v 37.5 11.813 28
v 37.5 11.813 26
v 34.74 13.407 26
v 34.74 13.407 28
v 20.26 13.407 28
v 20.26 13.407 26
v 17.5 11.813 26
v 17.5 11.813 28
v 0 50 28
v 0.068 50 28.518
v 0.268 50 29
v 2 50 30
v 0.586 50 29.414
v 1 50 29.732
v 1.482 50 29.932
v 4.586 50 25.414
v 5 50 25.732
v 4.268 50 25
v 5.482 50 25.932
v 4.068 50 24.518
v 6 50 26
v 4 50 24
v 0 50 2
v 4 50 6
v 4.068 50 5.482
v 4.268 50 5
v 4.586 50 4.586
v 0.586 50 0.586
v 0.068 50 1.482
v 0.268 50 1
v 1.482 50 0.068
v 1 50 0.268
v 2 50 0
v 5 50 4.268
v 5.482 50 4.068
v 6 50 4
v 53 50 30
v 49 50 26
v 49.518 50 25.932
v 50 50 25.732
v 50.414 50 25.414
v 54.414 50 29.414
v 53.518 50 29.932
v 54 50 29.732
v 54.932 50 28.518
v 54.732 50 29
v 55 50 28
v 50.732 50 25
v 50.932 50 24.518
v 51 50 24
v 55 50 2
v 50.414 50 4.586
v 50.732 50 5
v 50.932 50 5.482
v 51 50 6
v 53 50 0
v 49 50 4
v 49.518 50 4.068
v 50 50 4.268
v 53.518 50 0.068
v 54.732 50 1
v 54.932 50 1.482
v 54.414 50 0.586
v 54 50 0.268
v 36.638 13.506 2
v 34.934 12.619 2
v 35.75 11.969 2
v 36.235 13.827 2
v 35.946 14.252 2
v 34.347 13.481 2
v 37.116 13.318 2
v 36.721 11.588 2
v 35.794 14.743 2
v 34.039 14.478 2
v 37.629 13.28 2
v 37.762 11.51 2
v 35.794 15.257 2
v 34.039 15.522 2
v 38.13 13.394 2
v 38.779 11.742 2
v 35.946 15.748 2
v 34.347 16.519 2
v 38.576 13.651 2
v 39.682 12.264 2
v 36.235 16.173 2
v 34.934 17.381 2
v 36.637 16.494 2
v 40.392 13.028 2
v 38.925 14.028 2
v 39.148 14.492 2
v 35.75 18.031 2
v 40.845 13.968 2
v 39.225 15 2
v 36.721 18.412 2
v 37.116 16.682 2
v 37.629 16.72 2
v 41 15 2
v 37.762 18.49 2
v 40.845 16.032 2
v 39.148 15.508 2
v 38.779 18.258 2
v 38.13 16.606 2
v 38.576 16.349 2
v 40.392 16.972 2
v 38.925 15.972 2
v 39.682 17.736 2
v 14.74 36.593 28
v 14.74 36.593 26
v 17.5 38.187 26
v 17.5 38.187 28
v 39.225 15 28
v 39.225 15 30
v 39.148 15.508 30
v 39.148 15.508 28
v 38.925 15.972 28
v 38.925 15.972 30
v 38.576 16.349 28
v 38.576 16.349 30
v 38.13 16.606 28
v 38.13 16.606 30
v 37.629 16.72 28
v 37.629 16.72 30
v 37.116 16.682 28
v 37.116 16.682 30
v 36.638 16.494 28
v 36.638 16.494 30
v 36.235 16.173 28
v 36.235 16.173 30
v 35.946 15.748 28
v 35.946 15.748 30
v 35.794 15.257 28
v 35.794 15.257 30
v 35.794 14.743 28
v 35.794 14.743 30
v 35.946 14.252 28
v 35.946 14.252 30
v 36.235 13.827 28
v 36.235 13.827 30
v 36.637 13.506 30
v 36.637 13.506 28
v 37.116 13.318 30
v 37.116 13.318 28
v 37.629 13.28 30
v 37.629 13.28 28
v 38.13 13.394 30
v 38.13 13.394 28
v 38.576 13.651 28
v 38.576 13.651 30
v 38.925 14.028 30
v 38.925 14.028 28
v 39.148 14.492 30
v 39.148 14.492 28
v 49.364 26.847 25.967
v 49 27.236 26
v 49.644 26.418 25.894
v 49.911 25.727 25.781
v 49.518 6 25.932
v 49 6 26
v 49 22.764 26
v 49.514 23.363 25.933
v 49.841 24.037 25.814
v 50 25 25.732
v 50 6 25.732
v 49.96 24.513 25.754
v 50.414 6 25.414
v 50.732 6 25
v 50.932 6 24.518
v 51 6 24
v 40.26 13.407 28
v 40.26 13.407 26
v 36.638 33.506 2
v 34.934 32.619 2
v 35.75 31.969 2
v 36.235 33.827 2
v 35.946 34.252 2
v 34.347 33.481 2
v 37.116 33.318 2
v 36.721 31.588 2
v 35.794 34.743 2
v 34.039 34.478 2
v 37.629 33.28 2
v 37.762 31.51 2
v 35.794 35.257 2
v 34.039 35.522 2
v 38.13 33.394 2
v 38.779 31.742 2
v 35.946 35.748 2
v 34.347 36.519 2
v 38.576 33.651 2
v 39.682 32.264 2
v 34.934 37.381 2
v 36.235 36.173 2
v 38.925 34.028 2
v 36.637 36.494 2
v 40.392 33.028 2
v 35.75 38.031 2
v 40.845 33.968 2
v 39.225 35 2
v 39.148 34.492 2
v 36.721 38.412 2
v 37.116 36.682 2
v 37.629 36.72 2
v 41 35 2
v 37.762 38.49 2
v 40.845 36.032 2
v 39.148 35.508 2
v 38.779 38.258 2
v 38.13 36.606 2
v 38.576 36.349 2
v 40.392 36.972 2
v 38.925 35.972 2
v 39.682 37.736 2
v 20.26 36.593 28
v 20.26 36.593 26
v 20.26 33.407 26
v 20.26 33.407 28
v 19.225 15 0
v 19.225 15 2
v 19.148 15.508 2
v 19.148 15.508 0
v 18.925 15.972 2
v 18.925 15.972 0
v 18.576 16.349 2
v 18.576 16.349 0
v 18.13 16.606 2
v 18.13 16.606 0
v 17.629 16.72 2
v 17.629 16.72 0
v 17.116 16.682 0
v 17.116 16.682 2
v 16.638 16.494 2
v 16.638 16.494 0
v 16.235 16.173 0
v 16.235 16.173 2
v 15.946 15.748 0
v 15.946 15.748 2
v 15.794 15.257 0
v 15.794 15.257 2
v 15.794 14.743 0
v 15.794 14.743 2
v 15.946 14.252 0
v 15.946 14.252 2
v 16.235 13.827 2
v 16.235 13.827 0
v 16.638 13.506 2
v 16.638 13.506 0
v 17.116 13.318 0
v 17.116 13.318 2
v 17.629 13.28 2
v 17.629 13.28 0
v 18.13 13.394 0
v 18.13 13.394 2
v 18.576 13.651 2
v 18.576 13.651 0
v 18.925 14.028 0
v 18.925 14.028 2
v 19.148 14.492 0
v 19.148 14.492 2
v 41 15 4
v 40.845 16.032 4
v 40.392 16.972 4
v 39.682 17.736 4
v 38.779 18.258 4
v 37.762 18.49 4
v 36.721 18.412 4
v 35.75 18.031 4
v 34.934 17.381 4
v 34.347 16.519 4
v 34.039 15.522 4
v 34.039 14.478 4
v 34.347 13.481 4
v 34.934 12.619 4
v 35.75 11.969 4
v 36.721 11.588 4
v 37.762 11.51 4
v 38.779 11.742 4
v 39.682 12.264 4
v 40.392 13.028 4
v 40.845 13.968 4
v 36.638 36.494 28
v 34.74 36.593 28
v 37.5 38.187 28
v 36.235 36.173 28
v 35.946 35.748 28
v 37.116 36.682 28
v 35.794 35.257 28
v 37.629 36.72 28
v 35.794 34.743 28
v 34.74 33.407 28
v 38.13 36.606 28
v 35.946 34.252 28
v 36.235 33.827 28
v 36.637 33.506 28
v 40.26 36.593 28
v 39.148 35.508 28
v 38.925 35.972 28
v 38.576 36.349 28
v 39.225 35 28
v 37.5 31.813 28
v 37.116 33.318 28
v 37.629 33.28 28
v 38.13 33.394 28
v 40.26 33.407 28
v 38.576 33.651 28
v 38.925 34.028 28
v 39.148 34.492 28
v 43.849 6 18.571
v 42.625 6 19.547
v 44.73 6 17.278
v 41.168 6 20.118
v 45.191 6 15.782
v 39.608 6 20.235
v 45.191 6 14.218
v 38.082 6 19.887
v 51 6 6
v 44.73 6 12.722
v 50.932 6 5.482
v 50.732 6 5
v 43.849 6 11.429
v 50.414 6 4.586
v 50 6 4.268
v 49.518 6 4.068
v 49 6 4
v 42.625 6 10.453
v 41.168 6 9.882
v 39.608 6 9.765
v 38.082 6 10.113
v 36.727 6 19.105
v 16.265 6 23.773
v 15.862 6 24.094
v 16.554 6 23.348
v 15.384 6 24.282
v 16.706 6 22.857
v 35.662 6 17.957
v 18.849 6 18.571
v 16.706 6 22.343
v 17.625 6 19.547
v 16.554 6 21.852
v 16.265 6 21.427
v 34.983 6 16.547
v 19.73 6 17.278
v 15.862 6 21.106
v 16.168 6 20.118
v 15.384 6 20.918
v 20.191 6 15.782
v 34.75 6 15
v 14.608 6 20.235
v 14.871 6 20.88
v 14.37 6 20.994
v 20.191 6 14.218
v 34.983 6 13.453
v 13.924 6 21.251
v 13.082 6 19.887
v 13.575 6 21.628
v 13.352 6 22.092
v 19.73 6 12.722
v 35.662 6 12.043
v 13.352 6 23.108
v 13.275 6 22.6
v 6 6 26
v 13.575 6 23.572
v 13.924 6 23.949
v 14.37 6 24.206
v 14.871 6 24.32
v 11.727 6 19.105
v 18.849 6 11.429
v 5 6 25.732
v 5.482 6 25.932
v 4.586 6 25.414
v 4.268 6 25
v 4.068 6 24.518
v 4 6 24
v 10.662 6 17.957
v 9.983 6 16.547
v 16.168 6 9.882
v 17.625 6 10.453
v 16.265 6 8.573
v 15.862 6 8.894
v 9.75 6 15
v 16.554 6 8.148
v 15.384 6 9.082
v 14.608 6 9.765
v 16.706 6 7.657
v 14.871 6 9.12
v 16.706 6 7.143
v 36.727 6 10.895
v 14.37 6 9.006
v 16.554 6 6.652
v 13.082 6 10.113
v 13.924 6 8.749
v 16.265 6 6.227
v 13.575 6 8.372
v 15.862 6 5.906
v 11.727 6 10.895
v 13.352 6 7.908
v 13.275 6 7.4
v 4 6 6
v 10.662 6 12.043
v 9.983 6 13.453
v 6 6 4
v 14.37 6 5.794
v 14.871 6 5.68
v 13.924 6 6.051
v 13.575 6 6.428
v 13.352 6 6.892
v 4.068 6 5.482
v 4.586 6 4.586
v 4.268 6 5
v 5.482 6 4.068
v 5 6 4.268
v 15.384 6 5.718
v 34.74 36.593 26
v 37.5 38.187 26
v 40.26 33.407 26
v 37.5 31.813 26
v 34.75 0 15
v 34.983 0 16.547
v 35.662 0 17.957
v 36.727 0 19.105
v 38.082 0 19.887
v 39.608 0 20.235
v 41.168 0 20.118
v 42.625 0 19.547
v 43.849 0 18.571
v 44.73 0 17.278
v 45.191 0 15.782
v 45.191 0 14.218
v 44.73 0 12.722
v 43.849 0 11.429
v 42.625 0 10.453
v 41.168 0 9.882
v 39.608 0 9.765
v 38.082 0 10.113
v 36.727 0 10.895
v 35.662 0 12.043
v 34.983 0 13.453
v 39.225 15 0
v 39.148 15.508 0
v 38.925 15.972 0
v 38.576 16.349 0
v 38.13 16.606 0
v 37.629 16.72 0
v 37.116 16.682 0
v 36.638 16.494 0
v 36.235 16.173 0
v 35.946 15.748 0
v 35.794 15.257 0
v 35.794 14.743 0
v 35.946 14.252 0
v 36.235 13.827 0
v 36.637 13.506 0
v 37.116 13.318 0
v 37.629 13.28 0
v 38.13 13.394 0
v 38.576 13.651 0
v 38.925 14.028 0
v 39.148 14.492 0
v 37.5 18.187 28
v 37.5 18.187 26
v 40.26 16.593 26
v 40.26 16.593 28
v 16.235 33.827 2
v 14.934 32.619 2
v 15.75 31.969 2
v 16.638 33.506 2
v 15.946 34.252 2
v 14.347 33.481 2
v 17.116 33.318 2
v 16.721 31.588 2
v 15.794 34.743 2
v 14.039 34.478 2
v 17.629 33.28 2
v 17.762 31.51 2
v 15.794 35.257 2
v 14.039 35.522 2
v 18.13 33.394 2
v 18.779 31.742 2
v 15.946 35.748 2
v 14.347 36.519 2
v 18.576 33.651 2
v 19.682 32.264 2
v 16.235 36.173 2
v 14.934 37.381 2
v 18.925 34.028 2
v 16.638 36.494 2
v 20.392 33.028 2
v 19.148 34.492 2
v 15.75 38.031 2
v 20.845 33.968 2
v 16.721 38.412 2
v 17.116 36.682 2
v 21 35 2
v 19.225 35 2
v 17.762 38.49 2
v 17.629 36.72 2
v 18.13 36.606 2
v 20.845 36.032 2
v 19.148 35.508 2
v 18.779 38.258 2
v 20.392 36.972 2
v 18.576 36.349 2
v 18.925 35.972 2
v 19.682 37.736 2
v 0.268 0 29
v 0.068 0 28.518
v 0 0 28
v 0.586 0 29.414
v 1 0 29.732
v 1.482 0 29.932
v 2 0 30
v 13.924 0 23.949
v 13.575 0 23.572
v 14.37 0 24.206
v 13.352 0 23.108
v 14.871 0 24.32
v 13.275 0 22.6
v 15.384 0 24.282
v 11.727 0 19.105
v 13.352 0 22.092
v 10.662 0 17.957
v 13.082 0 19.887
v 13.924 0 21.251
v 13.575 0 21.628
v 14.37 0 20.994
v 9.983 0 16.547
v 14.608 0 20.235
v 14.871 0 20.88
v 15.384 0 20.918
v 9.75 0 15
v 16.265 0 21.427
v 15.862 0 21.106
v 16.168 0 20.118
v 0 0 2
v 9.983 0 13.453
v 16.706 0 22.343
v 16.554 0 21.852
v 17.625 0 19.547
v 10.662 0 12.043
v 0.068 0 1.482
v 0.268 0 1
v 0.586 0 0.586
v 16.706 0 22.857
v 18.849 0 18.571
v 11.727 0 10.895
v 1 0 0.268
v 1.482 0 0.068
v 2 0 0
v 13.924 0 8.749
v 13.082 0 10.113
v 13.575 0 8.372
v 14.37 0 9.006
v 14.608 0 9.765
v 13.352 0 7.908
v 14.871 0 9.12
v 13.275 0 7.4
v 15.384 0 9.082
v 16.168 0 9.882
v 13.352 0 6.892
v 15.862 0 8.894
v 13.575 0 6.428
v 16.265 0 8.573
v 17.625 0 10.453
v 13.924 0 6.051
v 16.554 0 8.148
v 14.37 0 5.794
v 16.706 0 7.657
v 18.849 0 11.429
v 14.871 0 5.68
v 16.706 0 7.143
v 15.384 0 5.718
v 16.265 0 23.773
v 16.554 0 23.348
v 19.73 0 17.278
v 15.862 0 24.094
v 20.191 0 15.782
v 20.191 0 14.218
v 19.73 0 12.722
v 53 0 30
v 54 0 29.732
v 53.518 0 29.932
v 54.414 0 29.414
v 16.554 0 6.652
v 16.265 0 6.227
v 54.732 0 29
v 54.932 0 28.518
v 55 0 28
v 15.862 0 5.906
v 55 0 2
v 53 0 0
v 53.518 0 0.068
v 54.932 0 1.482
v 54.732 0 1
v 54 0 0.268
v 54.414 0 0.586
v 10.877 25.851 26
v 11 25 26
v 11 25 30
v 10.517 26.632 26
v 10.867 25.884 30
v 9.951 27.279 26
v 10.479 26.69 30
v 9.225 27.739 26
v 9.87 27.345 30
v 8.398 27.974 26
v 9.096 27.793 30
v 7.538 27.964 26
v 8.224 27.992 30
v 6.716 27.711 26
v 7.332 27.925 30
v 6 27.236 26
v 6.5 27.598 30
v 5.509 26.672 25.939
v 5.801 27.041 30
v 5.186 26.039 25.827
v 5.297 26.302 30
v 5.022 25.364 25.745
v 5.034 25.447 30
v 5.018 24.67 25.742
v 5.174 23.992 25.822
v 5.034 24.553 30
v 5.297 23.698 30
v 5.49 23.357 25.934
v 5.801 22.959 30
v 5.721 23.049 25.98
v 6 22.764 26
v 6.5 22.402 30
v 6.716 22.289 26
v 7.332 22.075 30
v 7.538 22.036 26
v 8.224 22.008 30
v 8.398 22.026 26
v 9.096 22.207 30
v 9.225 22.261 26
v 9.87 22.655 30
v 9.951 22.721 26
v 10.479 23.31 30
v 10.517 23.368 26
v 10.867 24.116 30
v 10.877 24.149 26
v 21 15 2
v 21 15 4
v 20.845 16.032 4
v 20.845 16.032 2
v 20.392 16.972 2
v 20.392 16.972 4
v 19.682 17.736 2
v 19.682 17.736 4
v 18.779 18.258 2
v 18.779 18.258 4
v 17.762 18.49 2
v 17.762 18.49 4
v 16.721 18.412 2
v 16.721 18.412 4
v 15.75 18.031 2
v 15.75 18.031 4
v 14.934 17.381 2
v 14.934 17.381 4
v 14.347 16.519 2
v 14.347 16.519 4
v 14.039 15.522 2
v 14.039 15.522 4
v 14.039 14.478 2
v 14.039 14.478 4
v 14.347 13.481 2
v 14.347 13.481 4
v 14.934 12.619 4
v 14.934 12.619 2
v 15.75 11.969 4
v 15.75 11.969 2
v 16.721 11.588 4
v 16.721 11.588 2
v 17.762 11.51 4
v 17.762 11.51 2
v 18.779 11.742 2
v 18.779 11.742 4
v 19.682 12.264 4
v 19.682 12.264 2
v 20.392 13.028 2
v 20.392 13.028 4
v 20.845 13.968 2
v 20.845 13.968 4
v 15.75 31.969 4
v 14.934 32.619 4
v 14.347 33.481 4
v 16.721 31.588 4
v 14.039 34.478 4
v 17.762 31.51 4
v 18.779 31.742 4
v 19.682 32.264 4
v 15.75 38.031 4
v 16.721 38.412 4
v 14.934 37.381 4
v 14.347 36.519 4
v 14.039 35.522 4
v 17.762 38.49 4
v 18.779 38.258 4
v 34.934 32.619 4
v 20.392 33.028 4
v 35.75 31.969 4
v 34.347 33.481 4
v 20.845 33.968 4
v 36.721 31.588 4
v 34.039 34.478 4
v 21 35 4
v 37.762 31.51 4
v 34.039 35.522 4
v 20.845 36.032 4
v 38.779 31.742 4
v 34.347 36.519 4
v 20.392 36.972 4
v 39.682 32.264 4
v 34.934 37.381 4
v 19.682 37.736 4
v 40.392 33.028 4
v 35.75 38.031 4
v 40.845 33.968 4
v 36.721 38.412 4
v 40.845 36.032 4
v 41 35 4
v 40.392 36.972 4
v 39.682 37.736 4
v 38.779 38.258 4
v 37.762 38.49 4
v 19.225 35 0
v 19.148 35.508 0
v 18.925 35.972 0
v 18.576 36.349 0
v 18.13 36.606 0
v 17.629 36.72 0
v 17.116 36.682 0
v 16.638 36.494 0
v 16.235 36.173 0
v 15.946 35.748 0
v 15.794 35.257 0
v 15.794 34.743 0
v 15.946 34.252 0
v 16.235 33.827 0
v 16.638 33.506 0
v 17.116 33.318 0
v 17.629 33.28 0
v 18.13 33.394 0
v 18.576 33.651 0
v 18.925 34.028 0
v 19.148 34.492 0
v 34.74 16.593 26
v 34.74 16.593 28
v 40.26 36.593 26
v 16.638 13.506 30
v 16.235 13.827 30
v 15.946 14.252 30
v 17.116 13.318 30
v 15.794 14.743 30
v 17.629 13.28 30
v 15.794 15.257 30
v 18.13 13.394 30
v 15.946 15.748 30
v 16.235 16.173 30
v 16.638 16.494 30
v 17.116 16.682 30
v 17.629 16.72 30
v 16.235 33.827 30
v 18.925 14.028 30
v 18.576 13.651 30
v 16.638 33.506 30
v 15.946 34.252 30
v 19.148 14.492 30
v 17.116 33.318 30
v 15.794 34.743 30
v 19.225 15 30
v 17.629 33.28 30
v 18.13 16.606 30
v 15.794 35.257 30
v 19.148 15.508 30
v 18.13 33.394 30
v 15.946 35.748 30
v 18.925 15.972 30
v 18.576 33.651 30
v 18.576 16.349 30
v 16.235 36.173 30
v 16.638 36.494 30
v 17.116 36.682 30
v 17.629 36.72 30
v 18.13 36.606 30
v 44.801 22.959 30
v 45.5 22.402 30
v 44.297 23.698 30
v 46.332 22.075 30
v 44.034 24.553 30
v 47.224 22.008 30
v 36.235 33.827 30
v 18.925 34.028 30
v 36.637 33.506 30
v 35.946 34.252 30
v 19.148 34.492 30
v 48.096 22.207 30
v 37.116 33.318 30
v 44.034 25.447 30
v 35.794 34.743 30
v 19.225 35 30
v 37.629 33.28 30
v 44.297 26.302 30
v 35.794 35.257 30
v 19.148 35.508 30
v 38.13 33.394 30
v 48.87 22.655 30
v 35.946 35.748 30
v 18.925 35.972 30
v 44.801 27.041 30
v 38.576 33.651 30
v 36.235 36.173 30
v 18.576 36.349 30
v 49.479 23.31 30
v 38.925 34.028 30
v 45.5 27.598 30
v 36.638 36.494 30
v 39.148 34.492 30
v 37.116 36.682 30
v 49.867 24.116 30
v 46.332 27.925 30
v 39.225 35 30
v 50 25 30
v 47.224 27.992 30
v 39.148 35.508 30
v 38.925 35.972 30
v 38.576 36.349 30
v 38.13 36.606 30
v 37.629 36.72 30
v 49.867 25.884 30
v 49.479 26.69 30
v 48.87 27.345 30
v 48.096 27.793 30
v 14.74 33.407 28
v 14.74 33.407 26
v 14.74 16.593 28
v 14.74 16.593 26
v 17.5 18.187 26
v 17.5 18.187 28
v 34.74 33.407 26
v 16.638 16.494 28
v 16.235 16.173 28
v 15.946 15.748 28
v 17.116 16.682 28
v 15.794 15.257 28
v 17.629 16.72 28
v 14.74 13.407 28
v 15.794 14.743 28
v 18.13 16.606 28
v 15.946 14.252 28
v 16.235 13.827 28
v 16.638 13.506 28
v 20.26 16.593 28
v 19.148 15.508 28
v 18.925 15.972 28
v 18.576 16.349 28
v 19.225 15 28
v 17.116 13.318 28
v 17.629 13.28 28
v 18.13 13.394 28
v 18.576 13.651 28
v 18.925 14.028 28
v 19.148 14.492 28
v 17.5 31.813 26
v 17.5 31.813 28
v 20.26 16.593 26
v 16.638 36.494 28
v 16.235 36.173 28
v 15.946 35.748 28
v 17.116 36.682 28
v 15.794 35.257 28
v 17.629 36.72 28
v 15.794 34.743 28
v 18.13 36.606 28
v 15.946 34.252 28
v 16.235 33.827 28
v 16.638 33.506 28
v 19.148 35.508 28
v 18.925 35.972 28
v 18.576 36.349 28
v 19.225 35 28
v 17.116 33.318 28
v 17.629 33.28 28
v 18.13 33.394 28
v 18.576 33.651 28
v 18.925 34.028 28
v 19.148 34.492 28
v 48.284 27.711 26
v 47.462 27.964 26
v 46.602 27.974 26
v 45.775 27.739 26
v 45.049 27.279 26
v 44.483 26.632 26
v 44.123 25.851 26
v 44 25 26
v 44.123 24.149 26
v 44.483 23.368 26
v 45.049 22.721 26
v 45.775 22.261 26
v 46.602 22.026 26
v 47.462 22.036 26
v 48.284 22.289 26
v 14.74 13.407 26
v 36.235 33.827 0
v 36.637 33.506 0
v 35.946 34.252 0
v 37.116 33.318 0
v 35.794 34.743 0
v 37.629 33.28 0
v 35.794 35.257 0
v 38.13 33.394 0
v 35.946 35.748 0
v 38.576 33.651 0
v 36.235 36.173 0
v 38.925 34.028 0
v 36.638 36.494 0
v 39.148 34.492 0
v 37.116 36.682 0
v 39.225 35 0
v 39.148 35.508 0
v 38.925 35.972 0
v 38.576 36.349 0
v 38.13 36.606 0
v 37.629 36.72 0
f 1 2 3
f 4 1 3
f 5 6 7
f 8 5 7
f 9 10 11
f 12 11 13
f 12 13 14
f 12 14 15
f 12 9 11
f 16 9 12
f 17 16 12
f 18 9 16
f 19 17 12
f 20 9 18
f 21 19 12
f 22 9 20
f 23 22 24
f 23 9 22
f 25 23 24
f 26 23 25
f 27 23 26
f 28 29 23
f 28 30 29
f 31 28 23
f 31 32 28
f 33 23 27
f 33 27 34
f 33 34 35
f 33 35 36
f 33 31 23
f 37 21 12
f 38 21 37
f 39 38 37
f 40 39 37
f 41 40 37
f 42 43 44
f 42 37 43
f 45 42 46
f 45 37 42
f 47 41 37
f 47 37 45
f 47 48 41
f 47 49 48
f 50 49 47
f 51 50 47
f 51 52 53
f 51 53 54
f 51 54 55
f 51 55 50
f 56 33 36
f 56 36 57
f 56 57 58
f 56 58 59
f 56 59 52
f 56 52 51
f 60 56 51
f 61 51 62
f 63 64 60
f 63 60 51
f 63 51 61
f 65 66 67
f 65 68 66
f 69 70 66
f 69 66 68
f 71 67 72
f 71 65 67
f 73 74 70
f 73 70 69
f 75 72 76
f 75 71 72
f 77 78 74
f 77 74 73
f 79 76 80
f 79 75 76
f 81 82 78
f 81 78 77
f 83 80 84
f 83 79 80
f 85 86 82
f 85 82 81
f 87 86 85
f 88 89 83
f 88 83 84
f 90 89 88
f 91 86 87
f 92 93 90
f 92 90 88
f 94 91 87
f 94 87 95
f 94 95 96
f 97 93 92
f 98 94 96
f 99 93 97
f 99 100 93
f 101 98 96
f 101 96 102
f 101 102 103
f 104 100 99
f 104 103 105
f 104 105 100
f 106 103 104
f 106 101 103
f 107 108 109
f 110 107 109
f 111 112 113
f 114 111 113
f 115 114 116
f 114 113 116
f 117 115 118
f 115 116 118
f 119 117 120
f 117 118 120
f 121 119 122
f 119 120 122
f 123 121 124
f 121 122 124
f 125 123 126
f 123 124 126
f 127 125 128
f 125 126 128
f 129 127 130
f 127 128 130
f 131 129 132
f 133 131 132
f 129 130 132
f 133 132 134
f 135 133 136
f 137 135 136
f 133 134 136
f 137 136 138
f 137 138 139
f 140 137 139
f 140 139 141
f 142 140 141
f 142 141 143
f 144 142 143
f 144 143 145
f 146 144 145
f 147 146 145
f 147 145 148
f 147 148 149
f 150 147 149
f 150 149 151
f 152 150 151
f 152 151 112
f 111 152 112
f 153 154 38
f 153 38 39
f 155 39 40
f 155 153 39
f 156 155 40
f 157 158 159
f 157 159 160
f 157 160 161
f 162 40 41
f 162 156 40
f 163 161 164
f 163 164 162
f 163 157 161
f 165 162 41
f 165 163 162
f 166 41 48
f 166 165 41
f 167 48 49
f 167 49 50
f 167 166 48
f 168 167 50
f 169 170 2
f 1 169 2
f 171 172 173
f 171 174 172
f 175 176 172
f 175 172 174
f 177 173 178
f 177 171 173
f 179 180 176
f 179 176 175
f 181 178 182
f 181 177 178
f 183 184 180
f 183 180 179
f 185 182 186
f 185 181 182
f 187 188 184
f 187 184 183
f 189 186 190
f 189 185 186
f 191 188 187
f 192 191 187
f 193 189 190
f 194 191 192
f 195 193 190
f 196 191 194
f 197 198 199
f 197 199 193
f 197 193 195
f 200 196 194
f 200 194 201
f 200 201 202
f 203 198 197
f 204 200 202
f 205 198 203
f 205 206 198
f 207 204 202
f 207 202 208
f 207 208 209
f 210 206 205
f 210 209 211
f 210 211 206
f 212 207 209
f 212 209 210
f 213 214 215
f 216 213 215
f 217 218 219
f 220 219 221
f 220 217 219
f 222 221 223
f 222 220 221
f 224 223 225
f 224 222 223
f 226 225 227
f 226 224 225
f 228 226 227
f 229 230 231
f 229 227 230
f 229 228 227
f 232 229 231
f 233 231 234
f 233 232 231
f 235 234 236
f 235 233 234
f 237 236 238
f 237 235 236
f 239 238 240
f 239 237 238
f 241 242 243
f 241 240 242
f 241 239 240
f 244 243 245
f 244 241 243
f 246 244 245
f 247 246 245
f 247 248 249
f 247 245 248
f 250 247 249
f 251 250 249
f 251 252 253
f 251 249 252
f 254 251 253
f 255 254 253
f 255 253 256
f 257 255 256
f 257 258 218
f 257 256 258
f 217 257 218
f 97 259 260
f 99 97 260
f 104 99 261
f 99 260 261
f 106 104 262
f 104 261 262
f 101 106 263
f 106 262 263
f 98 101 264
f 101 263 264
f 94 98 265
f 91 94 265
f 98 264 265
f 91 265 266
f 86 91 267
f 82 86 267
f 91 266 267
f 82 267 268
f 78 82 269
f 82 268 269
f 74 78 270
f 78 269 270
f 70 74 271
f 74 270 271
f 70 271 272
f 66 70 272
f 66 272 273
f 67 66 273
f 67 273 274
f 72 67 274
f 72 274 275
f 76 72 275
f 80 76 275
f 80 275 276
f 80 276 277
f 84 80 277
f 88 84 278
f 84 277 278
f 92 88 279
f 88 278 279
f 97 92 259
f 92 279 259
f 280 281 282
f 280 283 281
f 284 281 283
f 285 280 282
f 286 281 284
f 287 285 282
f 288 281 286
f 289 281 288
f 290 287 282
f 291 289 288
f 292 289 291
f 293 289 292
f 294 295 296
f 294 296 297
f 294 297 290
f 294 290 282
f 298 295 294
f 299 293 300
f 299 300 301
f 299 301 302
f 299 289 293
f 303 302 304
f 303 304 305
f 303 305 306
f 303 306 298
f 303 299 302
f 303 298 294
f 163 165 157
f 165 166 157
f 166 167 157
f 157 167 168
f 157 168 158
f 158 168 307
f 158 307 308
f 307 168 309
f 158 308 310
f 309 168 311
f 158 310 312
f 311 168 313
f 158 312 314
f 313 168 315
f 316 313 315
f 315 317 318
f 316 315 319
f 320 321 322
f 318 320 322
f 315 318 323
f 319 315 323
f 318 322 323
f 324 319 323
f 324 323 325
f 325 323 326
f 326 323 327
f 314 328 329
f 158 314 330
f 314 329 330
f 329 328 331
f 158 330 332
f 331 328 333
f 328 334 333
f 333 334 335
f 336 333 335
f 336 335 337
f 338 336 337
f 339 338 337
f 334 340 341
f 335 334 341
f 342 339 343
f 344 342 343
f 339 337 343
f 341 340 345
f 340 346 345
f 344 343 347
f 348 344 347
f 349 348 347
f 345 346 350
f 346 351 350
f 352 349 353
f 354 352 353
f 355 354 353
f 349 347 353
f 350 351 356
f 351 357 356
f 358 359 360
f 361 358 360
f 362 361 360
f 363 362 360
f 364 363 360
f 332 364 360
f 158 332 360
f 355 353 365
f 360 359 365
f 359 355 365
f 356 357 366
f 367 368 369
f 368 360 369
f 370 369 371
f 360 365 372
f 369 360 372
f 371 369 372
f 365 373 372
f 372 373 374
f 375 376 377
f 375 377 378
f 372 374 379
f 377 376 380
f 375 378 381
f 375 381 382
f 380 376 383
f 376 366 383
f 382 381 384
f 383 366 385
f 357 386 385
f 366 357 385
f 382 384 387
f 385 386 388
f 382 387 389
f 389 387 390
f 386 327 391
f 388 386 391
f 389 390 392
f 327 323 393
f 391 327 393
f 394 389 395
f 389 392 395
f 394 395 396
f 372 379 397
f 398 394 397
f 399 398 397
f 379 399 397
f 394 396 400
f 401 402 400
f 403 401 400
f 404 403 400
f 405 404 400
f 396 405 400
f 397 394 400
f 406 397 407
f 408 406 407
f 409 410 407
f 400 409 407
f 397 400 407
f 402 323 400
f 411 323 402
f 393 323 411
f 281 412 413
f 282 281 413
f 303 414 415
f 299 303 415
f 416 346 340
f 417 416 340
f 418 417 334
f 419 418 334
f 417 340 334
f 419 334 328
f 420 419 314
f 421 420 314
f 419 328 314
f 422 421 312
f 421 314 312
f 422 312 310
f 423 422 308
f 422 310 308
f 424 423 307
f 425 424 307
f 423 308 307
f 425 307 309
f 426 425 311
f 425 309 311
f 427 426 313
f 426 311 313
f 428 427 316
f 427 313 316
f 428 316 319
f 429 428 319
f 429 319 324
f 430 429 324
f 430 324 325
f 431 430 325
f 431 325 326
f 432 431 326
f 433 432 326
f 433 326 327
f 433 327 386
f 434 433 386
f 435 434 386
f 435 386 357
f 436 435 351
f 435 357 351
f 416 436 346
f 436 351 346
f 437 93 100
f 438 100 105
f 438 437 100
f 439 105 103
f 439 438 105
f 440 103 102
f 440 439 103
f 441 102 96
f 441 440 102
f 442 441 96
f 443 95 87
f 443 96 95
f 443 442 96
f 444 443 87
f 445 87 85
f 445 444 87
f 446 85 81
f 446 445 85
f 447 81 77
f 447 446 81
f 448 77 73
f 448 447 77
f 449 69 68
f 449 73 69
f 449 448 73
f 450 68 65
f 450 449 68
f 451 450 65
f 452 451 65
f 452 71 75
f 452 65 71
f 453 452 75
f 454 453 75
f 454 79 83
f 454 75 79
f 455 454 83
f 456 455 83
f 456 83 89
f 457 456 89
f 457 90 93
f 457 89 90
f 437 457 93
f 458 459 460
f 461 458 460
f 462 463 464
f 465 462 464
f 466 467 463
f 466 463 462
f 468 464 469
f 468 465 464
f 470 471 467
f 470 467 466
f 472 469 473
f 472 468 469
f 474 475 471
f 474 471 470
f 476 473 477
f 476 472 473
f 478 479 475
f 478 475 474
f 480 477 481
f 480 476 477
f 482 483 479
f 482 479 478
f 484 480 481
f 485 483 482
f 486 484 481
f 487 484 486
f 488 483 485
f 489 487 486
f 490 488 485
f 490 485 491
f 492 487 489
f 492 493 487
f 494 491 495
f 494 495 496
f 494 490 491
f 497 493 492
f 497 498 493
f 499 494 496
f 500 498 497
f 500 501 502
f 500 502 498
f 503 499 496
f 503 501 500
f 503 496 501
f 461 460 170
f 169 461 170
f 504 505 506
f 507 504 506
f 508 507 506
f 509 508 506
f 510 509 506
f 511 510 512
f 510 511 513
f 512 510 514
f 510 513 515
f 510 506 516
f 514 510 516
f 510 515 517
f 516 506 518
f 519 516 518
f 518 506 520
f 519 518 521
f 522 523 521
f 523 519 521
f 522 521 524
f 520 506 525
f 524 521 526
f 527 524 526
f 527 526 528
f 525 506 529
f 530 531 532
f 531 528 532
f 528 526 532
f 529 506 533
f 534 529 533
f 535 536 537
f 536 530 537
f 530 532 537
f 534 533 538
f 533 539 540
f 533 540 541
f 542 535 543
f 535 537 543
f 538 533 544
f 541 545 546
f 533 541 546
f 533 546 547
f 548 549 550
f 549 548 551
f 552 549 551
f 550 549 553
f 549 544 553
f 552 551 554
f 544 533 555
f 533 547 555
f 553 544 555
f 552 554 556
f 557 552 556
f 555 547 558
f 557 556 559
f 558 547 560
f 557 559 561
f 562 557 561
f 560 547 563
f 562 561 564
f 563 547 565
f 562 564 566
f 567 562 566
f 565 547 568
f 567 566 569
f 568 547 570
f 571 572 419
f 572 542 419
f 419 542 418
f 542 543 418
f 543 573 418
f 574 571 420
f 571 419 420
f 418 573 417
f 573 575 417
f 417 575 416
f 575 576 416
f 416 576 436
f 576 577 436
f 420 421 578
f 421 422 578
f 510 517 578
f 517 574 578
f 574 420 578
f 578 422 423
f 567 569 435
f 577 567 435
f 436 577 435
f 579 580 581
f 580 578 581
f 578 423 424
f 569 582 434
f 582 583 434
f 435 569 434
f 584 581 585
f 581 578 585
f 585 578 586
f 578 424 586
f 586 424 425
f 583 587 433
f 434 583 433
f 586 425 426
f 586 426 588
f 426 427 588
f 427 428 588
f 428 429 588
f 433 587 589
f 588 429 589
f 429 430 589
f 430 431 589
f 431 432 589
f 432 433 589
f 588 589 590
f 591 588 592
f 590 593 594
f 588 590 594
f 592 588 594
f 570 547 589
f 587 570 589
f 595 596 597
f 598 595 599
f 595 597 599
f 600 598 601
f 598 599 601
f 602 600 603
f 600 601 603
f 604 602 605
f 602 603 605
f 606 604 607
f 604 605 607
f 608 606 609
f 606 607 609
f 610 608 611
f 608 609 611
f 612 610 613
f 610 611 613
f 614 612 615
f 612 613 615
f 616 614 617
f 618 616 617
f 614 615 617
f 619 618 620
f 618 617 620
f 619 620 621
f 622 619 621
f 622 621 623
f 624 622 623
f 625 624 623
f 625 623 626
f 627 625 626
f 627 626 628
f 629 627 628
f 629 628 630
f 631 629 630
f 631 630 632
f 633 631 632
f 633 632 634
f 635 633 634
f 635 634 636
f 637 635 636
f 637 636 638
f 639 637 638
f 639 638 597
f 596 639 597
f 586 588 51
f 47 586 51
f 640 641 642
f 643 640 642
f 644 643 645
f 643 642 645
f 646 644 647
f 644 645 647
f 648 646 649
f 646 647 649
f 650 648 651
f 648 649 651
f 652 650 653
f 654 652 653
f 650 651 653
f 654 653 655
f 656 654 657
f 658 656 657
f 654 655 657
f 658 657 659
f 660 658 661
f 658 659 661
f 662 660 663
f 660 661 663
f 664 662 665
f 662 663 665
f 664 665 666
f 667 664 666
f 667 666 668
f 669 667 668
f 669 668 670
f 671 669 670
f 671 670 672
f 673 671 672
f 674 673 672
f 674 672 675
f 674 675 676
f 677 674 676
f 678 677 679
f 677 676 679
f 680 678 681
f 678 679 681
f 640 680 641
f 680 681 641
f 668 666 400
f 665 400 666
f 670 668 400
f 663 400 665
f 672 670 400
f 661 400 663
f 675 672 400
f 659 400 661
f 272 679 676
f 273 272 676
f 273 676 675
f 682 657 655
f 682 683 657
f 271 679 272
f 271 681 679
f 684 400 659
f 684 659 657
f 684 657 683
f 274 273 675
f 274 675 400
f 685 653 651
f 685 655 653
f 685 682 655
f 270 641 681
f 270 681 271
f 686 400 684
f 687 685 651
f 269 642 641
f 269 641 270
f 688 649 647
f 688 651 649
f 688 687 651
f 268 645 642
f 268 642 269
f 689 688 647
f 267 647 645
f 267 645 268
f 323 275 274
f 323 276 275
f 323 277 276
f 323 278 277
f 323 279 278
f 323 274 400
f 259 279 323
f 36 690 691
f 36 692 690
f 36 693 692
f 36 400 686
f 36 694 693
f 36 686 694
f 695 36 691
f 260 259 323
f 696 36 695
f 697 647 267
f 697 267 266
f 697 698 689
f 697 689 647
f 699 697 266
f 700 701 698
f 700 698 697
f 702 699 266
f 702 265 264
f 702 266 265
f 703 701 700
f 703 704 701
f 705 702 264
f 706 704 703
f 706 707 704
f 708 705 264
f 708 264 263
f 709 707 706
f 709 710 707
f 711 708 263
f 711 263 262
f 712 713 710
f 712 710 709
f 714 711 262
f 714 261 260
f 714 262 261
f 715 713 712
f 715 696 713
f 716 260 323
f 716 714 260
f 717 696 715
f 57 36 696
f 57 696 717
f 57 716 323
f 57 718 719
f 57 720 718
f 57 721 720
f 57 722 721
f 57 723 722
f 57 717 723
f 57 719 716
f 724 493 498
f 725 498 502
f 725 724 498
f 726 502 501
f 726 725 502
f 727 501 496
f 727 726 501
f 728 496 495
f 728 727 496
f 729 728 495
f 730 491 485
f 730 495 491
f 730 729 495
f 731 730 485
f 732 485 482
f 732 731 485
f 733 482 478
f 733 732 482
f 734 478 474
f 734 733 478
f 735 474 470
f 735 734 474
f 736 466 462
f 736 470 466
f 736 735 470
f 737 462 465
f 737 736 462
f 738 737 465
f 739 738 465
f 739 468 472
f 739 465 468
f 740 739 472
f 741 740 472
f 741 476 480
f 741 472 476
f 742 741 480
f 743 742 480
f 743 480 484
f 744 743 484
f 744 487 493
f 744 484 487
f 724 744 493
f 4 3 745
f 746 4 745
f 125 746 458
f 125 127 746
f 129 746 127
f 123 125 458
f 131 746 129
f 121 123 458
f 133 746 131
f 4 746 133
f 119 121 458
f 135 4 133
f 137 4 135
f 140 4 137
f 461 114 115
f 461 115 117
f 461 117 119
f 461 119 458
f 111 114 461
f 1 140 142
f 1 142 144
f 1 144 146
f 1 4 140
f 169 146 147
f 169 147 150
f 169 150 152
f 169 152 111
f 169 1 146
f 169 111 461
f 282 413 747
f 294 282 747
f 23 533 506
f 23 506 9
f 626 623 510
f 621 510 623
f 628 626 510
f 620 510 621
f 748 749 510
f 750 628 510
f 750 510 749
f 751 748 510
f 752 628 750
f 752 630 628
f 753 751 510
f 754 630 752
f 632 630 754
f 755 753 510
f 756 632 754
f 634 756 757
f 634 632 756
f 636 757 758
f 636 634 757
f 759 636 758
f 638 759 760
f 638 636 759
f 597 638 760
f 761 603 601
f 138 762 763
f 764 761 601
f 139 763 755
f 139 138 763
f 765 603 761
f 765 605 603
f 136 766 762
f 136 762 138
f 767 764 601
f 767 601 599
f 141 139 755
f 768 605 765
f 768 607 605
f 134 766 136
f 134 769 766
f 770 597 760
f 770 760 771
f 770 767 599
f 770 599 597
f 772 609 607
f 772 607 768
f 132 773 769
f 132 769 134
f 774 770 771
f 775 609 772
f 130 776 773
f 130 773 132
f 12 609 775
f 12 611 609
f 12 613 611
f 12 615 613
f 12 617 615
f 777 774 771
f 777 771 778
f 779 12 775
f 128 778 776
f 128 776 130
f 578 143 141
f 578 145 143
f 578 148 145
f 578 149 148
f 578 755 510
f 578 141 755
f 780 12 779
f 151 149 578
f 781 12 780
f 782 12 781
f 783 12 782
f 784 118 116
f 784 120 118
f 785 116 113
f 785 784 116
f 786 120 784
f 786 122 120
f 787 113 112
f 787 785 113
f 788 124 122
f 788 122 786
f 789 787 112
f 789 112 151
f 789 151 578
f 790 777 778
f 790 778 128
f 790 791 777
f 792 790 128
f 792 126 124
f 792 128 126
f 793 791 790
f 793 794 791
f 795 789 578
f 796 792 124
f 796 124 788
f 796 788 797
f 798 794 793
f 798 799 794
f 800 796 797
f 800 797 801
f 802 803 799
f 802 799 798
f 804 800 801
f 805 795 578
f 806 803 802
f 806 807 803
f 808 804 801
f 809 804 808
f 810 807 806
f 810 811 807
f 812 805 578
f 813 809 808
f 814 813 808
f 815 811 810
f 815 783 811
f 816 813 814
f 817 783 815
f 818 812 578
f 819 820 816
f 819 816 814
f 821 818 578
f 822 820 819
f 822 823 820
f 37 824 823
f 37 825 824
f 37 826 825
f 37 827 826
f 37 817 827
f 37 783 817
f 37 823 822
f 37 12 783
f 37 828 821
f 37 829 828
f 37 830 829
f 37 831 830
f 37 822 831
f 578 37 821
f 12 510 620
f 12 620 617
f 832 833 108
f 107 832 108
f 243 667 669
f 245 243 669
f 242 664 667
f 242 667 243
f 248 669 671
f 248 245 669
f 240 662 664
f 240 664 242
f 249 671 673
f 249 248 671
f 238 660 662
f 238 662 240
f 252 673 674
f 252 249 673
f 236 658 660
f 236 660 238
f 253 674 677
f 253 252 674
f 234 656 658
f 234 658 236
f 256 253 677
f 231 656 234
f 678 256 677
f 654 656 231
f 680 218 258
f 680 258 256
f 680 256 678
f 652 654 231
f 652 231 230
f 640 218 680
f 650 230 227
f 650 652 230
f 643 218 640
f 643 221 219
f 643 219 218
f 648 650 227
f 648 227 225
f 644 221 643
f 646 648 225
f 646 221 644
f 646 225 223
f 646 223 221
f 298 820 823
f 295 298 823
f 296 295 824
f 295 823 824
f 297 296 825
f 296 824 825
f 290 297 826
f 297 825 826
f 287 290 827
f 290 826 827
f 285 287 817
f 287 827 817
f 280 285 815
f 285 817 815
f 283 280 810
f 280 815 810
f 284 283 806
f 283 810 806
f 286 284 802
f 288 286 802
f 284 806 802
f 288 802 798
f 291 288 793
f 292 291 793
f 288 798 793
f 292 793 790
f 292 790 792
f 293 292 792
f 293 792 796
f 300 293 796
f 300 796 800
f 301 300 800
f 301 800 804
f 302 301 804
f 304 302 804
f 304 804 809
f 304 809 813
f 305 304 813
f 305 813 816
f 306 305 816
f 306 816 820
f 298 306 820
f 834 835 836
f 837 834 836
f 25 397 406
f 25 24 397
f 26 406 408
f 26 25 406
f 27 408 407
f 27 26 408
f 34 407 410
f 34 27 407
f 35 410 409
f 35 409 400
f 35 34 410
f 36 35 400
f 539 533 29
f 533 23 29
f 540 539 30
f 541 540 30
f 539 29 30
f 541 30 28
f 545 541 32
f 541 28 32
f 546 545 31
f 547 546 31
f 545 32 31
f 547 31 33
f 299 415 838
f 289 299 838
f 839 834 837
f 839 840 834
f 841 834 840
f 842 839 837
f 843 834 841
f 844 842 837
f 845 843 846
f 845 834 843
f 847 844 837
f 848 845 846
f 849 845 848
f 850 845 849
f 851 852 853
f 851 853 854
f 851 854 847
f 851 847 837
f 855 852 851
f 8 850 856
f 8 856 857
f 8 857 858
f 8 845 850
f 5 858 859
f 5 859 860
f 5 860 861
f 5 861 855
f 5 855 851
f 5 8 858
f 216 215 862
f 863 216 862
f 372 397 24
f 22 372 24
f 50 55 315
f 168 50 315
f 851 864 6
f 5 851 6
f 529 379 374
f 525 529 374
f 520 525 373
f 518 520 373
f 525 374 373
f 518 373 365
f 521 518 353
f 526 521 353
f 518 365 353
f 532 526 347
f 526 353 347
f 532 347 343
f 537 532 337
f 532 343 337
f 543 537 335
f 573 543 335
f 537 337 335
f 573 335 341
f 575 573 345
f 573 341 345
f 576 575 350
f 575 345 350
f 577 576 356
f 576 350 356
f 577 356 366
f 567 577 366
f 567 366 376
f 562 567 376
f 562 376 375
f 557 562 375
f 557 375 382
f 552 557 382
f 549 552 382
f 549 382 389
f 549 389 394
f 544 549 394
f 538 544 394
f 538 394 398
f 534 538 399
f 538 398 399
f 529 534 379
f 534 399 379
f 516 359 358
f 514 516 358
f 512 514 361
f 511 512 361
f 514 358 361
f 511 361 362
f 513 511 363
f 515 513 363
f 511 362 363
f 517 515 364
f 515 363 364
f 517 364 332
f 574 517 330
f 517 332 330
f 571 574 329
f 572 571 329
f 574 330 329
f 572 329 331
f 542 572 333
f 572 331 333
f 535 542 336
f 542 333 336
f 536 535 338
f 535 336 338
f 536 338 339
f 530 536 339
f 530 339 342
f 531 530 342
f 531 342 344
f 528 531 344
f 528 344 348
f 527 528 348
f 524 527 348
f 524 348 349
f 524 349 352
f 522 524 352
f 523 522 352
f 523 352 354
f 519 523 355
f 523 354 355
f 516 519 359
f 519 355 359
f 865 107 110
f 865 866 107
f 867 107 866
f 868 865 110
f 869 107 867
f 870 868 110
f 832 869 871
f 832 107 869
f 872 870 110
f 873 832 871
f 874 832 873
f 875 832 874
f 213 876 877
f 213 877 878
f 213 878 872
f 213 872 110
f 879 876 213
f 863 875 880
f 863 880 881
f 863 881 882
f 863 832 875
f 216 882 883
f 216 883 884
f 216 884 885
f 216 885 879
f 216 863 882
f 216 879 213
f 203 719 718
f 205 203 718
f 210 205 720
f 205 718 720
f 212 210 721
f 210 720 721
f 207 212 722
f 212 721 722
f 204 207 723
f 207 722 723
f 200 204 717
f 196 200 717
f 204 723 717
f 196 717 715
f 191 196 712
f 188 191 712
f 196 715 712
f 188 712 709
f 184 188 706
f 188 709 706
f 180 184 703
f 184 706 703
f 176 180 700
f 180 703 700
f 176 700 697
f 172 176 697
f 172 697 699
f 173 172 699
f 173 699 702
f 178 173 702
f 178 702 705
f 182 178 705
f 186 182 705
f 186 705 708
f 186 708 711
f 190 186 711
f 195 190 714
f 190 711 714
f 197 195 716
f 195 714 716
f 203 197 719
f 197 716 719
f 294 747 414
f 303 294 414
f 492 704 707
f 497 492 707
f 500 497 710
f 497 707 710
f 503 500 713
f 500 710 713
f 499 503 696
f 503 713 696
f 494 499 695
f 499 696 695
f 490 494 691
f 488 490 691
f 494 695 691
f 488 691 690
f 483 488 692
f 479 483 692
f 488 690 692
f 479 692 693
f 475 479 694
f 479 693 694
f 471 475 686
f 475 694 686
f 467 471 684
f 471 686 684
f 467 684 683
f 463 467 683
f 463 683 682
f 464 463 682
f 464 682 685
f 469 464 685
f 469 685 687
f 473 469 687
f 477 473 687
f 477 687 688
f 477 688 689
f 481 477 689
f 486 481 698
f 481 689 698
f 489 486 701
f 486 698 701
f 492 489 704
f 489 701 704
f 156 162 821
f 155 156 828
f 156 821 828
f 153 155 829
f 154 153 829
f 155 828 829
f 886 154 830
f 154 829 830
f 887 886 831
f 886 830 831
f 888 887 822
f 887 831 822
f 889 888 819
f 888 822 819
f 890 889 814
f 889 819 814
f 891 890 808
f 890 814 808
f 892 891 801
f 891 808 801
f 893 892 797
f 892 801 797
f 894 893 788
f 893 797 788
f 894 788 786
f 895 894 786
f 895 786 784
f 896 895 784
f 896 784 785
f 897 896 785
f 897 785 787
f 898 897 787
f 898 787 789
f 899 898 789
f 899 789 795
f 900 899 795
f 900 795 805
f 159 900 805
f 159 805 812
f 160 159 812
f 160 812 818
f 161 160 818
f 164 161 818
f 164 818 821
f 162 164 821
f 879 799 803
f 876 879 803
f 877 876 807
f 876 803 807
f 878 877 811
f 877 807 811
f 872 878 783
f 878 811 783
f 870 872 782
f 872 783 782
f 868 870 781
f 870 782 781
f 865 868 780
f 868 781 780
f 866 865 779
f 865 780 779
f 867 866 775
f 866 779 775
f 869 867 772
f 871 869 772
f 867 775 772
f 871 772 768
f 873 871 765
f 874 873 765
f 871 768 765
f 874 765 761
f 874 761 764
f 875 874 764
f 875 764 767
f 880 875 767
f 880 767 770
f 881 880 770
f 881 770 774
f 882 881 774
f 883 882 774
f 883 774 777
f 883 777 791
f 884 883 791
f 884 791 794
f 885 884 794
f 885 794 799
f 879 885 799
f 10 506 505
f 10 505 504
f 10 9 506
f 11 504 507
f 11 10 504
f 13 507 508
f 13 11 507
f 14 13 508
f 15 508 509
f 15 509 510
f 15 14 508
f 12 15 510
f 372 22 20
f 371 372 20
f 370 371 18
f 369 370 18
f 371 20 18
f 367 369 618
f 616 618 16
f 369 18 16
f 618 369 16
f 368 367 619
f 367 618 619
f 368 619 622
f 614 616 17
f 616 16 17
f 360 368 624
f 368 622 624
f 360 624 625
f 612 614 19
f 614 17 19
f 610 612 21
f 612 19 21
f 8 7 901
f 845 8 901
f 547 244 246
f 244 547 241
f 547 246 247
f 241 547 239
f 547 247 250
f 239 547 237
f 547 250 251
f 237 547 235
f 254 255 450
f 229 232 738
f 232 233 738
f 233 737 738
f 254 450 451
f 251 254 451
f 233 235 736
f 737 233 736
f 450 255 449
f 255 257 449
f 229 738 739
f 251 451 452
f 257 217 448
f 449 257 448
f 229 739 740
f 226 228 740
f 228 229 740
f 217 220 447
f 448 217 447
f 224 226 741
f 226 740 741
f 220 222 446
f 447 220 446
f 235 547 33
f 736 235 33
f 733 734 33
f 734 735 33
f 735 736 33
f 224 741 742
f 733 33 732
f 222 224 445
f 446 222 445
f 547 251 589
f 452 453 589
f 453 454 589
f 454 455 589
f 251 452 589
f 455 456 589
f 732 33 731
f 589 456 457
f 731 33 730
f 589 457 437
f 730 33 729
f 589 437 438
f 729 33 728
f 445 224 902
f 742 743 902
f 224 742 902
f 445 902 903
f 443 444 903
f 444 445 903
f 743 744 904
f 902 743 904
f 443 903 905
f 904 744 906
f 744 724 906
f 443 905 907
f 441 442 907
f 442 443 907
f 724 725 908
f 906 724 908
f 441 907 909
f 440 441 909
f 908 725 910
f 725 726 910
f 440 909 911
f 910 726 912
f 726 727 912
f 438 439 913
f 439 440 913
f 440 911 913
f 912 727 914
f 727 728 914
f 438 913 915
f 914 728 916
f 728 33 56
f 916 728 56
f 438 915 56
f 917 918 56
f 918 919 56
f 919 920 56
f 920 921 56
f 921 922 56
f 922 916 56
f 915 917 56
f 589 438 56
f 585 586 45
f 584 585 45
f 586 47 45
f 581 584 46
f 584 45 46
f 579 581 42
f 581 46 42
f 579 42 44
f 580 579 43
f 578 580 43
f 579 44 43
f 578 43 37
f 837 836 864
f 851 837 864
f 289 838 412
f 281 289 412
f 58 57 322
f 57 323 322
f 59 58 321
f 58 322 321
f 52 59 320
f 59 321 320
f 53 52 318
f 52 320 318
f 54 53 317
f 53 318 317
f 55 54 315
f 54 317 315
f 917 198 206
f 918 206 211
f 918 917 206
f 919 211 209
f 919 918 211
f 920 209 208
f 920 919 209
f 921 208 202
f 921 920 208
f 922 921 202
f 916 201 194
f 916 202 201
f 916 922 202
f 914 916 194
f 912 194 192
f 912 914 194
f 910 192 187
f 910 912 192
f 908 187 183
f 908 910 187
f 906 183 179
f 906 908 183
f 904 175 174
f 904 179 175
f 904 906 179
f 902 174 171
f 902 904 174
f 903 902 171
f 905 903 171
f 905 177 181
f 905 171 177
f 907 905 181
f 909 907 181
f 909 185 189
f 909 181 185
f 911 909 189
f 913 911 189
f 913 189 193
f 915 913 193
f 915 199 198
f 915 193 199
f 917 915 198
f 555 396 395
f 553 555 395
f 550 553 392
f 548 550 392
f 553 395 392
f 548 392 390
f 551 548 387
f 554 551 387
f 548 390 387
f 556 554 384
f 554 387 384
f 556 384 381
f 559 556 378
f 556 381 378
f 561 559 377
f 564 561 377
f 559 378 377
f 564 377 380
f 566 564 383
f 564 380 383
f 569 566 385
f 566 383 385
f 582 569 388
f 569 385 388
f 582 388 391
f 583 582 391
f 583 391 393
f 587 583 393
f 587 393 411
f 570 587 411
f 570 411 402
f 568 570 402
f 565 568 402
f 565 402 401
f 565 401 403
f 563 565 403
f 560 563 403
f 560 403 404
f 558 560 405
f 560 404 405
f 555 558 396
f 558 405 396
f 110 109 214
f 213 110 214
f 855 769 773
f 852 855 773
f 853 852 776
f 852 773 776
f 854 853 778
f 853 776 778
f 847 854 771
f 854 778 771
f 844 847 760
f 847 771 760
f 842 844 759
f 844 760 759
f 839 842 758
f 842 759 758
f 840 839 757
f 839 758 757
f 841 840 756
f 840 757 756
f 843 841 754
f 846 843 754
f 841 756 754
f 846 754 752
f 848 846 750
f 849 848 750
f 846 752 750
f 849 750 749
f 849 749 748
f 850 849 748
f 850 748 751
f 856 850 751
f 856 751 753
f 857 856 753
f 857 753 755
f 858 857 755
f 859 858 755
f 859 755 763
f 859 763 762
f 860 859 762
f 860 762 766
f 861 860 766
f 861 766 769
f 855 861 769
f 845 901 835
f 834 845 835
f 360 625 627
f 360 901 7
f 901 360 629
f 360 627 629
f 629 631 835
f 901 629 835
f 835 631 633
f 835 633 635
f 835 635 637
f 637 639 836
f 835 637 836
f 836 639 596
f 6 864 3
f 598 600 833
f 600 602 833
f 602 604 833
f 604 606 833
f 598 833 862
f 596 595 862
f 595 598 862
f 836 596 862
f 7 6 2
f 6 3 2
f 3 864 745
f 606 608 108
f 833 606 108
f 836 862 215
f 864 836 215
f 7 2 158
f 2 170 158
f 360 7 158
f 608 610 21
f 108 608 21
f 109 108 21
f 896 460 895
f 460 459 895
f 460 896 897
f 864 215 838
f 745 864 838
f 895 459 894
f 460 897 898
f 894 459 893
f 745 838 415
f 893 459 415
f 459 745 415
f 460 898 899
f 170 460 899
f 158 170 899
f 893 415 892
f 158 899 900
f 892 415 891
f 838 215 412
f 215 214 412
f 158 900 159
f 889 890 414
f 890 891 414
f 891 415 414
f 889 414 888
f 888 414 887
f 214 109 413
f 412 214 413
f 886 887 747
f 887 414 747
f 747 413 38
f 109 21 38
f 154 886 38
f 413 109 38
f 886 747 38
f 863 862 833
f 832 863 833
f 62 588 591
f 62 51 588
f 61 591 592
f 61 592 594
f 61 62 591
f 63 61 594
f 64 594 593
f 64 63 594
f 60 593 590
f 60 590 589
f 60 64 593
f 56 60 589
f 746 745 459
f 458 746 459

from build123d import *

# Parameters (mm, degrees)
F0_W      = 55
F0_H      = 50
F0_R      = 3.5
F0_R_2    = 1.725
F1_DEPTH  = 4
F2_R      = 3.5
F3_DEPTH  = 2
F5_DEPTH  = 22
F6_R      = 5.25
F6_R_2    = 1.725
F7_DEPTH  = 6
F8_W      = 55
F8_H      = 50
F9_DEPTH  = 4
F10_R     = 2
F11_R     = 1.725
F12_DEPTH = 4
F14_DEPTH = 2
F15_R     = 3
F16_DEPTH = 4.2689492924


with BuildPart() as f1:
    # F0 (on Top) → F1 (new body)
    with BuildSketch(Plane.XY):
        with Locations((27.5, 25)):
            Rectangle(F0_W, F0_H)
        with Locations((17.5, 15)):
            Circle(F0_R, mode=Mode.SUBTRACT)
        with Locations((37.5, 15)):
            Circle(F0_R, mode=Mode.SUBTRACT)
        with Locations((17.5, 35)):
            Circle(F0_R, mode=Mode.SUBTRACT)
        with Locations((37.5, 35)):
            Circle(F0_R, mode=Mode.SUBTRACT)
        with Locations((17.5, 35)):
            Circle(F0_R)
        with Locations((17.5, 35)):
            Circle(F0_R_2, mode=Mode.SUBTRACT)
        with Locations((37.5, 35)):
            Circle(F0_R)
        with Locations((37.5, 35)):
            Circle(F0_R_2, mode=Mode.SUBTRACT)
        with Locations((37.5, 15)):
            Circle(F0_R)
        with Locations((37.5, 15)):
            Circle(F0_R_2, mode=Mode.SUBTRACT)
        with Locations((17.5, 15)):
            Circle(F0_R)
        with Locations((17.5, 15)):
            Circle(F0_R_2, mode=Mode.SUBTRACT)
    extrude(amount=F1_DEPTH)

    # F2 (on face) → F3 (cut)
    with BuildSketch(Plane.XY.offset(4)):
        with Locations((17.5, 35)):
            Circle(F2_R)
        with Locations((37.5, 35)):
            Circle(F2_R)
        with Locations((37.5, 15)):
            Circle(F2_R)
        with Locations((17.5, 15)):
            Circle(F2_R)
    extrude(amount=-F3_DEPTH, mode=Mode.SUBTRACT)

    # F4 (on face) → F5 (join)
    with BuildSketch(Plane.XY.offset(4)):
        Polygon((4, 50), (0, 50), (0, 0), (55, 0), (55, 50), (51, 50), (51, 6), (4, 6), align=None)
    extrude(amount=F5_DEPTH)

    # F6 (on face) → F7 (cut, through all)
    with BuildSketch(Plane(origin=(0, 6, 0), x_dir=(-1, 0, 0), z_dir=(0, 1, 0))):
        with Locations((-40, 15)):
            Circle(F6_R)
        with Locations((-15, 22.6)):
            Circle(F6_R_2)
        with Locations((-15, 7.4)):
            Circle(F6_R_2)
        with Locations((-15, 15)):
            Circle(F6_R)
    extrude(amount=-F7_DEPTH, mode=Mode.SUBTRACT)

    # F8 (on face) → F9 (join)
    with BuildSketch(Plane.XY.offset(26)):
        with Locations((27.5, 25)):
            Rectangle(F8_W, F8_H)
    extrude(amount=F9_DEPTH)

    # F10
    f10_edges = [f1.edges().sort_by_distance(p)[0] for p in [
        (0, 25, 30),
        (0, 25, 0),
        (55, 25, 0),
        (55, 25, 30),
        (51, 28, 26),
        (4, 28, 26),
        (4, 28, 4),
        (51, 28, 4),
    ]]
    fillet(f10_edges, radius=F10_R)

    # F11 (on face) → F12 (cut, through all)
    with BuildSketch(Plane.XY.offset(30)):
        with Locations((17.5, 35)):
            Circle(F11_R)
        with Locations((37.5, 35)):
            Circle(F11_R)
        with Locations((37.5, 15)):
            Circle(F11_R)
        with Locations((17.5, 15)):
            Circle(F11_R)
    extrude(amount=-F12_DEPTH, mode=Mode.SUBTRACT)

    # F13 (on face) → F14 (cut)
    with BuildSketch(Plane(origin=(0, 0, 26), x_dir=(1, 0, 0), z_dir=(0, 0, -1))):
        Polygon((20.26, -13.406513257), (17.5, -11.8130265141), (14.74, -13.406513257), (14.74, -16.593486743), (17.5, -18.1869734859), (20.26, -16.593486743), align=None)
        Polygon((40.26, -13.406513257), (37.5, -11.8130265141), (34.74, -13.406513257), (34.74, -16.593486743), (37.5, -18.1869734859), (40.26, -16.593486743), align=None)
        Polygon((40.26, -33.406513257), (37.5, -31.8130265141), (34.74, -33.406513257), (34.74, -36.593486743), (37.5, -38.1869734859), (40.26, -36.593486743), align=None)
        Polygon((20.26, -33.406513257), (17.5, -31.8130265141), (14.74, -33.406513257), (14.74, -36.593486743), (17.5, -38.1869734859), (20.26, -36.593486743), align=None)
    extrude(amount=-F14_DEPTH, mode=Mode.SUBTRACT)

    # F15 (on face) → F16 (cut, through all)
    with BuildSketch(Plane.XY.offset(30)):
        with Locations((8, 25)):
            Circle(F15_R)
        with Locations((47, 25)):
            Circle(F15_R)
    extrude(amount=-F16_DEPTH, mode=Mode.SUBTRACT)


solid = f1.part
